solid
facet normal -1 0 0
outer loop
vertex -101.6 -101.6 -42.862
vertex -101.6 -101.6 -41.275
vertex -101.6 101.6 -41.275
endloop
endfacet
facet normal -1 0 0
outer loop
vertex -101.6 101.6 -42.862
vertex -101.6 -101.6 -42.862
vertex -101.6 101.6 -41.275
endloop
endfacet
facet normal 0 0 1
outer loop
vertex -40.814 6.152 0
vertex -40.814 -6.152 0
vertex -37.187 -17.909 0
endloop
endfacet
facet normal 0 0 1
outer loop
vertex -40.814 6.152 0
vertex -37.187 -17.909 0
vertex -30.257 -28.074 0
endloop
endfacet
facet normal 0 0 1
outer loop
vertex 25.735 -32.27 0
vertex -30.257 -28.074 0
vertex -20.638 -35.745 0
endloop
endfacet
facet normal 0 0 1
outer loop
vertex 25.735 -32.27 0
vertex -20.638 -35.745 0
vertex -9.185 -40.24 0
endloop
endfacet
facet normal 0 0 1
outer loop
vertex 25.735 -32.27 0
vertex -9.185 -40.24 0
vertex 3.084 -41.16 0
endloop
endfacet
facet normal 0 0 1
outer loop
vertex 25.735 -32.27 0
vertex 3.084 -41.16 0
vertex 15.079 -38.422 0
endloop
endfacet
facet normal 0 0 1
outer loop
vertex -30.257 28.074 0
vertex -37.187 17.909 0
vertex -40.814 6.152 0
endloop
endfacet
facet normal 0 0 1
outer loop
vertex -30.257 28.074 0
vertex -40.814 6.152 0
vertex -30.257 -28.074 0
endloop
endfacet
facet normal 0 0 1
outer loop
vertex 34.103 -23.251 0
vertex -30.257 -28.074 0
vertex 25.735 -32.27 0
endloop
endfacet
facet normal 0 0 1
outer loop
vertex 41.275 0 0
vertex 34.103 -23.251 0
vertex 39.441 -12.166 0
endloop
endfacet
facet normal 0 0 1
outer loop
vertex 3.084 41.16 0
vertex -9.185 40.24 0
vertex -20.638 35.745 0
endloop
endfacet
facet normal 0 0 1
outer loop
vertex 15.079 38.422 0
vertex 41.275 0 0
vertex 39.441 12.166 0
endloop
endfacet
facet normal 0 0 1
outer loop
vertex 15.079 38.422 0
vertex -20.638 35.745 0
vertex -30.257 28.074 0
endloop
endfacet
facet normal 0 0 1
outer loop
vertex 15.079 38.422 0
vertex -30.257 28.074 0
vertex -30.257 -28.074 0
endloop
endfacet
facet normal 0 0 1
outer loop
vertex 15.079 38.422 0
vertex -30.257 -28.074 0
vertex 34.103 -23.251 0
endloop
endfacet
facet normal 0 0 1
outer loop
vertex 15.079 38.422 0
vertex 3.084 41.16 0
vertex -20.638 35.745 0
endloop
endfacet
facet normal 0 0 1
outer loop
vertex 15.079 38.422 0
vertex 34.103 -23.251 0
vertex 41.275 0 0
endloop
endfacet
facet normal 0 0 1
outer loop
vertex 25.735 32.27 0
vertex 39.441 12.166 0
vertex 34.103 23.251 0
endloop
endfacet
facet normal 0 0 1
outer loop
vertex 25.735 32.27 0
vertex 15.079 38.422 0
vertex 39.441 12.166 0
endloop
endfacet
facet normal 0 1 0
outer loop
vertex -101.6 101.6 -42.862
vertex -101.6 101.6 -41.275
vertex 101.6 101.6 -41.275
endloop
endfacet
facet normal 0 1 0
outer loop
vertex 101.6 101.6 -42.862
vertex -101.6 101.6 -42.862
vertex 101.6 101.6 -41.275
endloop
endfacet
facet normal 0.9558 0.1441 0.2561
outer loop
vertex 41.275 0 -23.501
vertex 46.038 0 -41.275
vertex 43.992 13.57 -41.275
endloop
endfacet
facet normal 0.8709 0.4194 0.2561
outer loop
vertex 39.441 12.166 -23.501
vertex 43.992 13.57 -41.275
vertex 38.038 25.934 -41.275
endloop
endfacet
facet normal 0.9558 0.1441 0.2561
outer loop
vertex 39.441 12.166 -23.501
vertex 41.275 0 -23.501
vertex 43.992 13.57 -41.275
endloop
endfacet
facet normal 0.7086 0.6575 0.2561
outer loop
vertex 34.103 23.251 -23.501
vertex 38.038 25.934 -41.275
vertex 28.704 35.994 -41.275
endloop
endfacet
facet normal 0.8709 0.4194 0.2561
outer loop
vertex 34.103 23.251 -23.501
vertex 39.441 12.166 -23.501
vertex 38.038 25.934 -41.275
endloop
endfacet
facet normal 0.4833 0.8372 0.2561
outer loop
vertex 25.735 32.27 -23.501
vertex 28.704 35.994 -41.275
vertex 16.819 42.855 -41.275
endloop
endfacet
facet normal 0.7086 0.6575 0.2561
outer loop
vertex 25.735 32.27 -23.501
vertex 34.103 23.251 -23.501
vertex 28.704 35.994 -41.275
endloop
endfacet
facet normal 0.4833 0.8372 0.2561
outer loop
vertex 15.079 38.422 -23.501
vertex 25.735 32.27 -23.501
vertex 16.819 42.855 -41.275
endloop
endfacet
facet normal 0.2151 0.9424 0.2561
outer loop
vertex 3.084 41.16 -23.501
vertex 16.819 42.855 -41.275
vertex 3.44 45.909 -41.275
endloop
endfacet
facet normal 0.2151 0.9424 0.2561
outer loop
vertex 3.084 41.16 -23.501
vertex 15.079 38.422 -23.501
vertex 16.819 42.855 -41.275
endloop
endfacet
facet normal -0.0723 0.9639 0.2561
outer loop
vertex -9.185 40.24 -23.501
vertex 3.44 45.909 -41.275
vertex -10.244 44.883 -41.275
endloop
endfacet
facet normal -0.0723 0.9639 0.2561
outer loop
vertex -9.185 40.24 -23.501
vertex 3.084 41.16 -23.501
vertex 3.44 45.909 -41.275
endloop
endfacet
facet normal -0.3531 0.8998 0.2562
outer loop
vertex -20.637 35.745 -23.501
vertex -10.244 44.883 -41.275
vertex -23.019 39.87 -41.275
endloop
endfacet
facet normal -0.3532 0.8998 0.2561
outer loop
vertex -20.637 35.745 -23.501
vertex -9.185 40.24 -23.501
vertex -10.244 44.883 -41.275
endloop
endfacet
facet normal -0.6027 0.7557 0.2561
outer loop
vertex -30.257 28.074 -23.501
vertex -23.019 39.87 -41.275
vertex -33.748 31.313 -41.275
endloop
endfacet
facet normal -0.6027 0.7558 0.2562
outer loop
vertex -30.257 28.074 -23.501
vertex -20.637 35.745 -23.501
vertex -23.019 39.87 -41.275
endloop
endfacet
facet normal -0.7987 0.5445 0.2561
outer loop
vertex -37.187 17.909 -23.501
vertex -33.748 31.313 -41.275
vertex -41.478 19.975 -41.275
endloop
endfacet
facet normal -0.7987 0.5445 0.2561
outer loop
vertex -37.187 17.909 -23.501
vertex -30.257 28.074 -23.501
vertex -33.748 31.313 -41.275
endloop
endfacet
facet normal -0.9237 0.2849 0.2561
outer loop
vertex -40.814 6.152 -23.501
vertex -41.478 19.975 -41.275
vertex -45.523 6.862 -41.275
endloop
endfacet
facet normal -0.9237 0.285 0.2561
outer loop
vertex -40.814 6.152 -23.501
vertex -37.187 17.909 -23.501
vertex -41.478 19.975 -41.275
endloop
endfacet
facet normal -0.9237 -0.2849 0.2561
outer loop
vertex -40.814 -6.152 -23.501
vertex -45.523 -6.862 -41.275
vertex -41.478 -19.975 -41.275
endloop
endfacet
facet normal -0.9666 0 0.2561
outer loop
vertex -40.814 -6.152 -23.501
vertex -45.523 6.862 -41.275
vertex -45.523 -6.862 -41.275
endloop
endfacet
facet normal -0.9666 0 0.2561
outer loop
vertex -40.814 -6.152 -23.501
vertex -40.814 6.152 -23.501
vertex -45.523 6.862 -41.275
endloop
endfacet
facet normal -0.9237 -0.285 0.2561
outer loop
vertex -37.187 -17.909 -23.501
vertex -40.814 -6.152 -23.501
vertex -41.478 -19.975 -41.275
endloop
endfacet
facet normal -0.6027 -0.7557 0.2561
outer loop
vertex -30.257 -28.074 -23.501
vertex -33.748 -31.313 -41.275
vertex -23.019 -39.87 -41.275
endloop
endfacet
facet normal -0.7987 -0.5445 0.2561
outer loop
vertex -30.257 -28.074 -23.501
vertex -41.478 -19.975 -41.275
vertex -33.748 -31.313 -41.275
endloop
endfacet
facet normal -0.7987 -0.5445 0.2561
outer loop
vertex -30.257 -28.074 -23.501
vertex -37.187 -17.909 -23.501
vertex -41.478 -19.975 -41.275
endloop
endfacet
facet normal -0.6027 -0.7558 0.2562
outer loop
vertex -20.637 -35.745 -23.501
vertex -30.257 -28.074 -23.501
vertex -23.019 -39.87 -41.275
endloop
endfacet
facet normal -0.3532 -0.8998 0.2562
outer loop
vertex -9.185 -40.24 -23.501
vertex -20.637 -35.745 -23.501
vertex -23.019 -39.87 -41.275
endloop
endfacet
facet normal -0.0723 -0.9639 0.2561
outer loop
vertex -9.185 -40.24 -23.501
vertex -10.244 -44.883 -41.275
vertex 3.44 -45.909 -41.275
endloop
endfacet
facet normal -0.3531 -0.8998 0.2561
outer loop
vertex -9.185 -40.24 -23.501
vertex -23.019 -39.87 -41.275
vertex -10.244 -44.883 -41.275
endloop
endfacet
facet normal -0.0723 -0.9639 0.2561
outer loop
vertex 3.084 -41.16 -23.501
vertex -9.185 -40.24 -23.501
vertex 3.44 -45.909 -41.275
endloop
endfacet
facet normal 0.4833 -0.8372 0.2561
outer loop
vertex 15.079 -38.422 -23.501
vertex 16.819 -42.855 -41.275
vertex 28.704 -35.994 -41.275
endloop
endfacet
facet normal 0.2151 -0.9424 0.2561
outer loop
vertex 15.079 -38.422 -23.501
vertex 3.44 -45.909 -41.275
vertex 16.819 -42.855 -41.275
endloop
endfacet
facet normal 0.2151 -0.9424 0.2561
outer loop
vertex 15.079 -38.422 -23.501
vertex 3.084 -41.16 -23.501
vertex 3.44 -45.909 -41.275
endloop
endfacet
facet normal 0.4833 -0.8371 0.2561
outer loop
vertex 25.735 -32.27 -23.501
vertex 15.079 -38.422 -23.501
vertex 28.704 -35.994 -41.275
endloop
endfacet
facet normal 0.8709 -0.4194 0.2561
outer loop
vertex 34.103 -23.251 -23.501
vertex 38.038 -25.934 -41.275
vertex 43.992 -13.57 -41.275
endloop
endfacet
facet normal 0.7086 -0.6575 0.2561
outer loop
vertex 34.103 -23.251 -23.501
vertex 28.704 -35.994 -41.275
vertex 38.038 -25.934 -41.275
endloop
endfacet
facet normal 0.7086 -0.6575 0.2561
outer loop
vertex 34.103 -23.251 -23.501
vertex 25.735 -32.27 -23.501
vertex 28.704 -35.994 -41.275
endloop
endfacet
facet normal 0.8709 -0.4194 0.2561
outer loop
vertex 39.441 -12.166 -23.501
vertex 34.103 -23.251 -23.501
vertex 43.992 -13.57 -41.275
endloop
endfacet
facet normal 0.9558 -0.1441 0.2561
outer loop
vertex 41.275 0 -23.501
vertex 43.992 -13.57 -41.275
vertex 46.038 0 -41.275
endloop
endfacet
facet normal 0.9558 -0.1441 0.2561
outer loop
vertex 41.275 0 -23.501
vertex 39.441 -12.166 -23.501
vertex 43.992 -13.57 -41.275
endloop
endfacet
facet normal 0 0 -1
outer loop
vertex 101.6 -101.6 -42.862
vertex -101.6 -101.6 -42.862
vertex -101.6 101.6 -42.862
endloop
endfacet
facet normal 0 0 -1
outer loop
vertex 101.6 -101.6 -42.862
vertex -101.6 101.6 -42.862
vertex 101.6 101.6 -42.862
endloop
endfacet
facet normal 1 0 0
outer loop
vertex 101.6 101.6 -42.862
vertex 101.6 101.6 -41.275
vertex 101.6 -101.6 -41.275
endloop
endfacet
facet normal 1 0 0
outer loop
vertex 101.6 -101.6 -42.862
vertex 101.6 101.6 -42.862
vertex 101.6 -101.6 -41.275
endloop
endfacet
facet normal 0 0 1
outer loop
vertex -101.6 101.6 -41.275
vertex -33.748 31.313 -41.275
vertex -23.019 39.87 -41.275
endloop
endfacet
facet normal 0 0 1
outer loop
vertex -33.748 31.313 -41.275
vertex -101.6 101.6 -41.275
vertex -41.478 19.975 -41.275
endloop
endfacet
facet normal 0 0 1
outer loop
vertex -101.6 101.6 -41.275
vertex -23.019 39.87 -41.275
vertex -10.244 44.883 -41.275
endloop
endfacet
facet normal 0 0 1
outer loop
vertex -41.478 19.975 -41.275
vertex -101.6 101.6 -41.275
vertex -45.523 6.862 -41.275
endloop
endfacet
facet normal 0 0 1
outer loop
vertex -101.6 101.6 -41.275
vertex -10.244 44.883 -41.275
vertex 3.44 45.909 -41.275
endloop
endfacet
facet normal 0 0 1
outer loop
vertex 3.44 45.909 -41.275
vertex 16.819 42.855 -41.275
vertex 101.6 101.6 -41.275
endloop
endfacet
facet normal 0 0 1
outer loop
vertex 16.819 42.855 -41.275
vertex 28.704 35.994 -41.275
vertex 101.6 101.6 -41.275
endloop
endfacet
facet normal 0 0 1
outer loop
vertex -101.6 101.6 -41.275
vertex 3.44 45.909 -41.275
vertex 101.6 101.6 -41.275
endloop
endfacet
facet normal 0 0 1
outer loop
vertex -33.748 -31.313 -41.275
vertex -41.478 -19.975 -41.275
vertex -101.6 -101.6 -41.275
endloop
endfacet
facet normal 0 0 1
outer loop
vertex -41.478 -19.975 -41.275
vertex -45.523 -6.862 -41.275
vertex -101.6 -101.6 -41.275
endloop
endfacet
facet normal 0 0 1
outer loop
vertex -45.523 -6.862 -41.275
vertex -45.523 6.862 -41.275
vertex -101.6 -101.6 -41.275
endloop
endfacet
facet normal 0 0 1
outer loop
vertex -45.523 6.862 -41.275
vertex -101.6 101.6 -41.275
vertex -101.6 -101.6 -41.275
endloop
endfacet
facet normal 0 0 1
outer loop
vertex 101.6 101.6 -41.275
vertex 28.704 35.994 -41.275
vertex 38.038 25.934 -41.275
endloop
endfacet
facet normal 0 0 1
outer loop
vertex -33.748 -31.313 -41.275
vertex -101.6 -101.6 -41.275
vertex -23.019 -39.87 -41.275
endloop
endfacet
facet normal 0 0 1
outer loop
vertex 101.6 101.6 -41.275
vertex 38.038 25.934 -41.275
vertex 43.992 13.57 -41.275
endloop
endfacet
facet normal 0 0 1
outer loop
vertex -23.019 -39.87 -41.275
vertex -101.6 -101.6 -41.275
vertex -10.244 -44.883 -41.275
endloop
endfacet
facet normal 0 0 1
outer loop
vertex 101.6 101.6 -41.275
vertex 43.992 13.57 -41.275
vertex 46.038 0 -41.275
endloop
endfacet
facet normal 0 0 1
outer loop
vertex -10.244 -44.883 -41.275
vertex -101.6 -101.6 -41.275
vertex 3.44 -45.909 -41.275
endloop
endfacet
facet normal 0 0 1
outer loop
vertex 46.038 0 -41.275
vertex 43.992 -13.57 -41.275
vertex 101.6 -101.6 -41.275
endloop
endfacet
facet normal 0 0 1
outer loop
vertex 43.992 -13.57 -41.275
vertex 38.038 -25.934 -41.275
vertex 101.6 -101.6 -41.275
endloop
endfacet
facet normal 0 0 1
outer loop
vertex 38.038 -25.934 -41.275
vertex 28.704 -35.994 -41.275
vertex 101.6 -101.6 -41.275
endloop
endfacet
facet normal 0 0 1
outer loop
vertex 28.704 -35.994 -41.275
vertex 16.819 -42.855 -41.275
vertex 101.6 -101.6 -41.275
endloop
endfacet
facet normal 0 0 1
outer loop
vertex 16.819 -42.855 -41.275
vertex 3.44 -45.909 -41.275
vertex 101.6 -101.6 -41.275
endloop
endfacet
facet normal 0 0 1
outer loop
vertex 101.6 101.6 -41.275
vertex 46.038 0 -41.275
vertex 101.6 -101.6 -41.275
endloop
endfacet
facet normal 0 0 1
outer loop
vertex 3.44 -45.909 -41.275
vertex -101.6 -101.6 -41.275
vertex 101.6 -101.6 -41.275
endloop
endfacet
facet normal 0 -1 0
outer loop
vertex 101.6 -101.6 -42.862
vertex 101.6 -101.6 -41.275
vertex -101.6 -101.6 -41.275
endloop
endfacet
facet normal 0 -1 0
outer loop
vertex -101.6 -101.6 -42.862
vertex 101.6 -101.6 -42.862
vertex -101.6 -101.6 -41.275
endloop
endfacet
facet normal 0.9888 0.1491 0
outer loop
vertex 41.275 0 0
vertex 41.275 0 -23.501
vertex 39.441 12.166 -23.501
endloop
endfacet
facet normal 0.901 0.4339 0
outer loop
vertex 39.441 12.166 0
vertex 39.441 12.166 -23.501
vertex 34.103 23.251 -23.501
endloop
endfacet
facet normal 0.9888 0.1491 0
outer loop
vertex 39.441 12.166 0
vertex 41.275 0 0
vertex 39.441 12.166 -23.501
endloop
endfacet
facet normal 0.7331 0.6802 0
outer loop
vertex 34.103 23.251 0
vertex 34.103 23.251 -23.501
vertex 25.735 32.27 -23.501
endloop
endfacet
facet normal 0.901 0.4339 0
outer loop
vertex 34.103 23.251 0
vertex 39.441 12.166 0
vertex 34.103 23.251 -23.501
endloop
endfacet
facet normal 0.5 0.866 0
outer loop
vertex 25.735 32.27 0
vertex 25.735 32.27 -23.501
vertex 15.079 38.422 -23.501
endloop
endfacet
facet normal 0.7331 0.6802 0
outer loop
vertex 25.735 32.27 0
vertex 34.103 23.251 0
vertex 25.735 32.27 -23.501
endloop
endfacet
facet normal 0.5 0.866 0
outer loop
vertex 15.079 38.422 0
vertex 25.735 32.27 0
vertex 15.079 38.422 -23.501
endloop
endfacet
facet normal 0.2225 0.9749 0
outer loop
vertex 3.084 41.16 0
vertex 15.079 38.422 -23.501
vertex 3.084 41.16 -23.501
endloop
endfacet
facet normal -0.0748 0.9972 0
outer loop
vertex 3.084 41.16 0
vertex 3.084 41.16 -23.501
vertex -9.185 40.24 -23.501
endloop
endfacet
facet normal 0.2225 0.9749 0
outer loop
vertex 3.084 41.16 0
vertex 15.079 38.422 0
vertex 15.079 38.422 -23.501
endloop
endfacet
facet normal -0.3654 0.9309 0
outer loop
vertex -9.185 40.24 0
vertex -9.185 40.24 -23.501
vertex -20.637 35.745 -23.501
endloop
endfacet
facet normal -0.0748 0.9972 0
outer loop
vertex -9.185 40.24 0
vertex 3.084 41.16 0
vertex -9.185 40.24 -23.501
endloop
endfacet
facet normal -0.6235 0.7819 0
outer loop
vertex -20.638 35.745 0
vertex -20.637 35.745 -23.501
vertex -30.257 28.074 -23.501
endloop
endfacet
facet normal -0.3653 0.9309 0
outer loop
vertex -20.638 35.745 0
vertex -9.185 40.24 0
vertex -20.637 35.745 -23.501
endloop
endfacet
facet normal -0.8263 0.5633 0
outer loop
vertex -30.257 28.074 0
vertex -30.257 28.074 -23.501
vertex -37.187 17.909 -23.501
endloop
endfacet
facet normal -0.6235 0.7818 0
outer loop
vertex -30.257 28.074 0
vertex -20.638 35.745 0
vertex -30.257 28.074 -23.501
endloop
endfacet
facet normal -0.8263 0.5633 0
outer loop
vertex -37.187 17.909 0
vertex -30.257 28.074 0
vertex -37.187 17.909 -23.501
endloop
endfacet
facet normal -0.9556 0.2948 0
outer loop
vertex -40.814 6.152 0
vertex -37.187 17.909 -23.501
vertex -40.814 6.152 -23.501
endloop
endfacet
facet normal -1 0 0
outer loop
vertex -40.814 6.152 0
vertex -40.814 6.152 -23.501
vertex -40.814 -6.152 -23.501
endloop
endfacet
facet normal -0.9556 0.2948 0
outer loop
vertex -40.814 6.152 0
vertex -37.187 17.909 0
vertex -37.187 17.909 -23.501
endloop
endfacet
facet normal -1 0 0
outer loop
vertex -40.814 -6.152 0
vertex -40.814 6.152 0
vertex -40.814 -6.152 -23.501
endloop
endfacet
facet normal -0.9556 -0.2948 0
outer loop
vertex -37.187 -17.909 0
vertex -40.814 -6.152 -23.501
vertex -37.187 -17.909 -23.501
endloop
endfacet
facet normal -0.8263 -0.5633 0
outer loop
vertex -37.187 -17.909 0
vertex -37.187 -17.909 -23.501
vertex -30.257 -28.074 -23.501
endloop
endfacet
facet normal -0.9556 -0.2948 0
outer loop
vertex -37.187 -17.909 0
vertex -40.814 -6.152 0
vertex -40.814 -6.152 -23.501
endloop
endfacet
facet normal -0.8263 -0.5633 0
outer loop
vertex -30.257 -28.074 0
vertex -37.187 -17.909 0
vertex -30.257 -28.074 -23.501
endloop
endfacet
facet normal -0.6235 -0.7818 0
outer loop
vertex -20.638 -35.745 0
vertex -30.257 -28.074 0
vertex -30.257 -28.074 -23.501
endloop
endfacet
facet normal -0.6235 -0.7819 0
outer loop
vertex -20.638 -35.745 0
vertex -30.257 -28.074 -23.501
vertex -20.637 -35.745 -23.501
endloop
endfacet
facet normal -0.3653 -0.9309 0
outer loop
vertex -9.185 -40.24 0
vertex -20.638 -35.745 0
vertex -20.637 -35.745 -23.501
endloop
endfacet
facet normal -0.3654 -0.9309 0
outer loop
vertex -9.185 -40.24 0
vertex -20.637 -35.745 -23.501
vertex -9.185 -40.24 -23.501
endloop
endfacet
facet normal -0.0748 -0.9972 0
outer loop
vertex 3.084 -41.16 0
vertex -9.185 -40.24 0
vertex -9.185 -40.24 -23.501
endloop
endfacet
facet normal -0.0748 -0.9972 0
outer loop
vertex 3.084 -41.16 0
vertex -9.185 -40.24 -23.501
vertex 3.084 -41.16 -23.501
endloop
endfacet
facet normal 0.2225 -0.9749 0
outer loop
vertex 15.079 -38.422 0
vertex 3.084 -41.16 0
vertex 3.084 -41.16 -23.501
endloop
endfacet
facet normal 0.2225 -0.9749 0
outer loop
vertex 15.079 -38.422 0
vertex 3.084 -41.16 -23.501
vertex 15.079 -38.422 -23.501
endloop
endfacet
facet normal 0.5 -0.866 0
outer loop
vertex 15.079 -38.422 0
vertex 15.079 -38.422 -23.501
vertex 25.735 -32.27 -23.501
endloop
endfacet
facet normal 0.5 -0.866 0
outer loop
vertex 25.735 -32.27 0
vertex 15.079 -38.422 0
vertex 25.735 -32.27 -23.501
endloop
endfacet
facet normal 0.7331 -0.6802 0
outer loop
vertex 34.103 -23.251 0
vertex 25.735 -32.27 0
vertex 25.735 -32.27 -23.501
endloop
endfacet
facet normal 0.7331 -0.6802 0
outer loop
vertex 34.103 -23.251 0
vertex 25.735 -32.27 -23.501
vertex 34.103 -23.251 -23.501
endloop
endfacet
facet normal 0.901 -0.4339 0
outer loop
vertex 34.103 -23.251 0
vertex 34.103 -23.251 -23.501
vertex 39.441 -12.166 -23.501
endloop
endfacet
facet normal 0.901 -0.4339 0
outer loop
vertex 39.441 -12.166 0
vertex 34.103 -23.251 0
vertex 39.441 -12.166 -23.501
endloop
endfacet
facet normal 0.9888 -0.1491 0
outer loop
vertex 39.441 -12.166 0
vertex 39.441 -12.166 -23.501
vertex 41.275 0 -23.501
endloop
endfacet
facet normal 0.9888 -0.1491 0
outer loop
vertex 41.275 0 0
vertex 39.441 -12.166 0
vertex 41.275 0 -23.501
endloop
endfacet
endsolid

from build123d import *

# Parameters (mm, degrees)
F2_R     = 46.0375
F3_DEPTH = 19.05
F3_TAPER = 15
F0_R     = 41.275
F4_DEPTH = 25.4
F5_R     = 46.0375
F6_DEPTH = 1.5875


with BuildPart() as f3:
    # F2 (on offset) → F3 (new body)
    with BuildSketch(Plane.XY.offset(-41.275)):
        Circle(F2_R)
    extrude(amount=F3_DEPTH, taper=F3_TAPER)

    # F0 (on Top) → F4 (join)
    with BuildSketch(Plane.XY):
        Circle(F0_R)
    extrude(amount=-F4_DEPTH)

    # F5 (on face) → F6 (join)
    with BuildSketch(Plane(origin=(0, 0, -41.275), x_dir=(1, 0, 0), z_dir=(0, 0, -1))):
        Polygon((101.6, -101.6), (101.6, 0), (101.6, 101.6), (-101.6, 101.6), (-101.6, -101.6), align=None)
        Circle(F5_R, mode=Mode.SUBTRACT)
        Circle(F5_R)
    extrude(amount=F6_DEPTH)


solid = f3.part
